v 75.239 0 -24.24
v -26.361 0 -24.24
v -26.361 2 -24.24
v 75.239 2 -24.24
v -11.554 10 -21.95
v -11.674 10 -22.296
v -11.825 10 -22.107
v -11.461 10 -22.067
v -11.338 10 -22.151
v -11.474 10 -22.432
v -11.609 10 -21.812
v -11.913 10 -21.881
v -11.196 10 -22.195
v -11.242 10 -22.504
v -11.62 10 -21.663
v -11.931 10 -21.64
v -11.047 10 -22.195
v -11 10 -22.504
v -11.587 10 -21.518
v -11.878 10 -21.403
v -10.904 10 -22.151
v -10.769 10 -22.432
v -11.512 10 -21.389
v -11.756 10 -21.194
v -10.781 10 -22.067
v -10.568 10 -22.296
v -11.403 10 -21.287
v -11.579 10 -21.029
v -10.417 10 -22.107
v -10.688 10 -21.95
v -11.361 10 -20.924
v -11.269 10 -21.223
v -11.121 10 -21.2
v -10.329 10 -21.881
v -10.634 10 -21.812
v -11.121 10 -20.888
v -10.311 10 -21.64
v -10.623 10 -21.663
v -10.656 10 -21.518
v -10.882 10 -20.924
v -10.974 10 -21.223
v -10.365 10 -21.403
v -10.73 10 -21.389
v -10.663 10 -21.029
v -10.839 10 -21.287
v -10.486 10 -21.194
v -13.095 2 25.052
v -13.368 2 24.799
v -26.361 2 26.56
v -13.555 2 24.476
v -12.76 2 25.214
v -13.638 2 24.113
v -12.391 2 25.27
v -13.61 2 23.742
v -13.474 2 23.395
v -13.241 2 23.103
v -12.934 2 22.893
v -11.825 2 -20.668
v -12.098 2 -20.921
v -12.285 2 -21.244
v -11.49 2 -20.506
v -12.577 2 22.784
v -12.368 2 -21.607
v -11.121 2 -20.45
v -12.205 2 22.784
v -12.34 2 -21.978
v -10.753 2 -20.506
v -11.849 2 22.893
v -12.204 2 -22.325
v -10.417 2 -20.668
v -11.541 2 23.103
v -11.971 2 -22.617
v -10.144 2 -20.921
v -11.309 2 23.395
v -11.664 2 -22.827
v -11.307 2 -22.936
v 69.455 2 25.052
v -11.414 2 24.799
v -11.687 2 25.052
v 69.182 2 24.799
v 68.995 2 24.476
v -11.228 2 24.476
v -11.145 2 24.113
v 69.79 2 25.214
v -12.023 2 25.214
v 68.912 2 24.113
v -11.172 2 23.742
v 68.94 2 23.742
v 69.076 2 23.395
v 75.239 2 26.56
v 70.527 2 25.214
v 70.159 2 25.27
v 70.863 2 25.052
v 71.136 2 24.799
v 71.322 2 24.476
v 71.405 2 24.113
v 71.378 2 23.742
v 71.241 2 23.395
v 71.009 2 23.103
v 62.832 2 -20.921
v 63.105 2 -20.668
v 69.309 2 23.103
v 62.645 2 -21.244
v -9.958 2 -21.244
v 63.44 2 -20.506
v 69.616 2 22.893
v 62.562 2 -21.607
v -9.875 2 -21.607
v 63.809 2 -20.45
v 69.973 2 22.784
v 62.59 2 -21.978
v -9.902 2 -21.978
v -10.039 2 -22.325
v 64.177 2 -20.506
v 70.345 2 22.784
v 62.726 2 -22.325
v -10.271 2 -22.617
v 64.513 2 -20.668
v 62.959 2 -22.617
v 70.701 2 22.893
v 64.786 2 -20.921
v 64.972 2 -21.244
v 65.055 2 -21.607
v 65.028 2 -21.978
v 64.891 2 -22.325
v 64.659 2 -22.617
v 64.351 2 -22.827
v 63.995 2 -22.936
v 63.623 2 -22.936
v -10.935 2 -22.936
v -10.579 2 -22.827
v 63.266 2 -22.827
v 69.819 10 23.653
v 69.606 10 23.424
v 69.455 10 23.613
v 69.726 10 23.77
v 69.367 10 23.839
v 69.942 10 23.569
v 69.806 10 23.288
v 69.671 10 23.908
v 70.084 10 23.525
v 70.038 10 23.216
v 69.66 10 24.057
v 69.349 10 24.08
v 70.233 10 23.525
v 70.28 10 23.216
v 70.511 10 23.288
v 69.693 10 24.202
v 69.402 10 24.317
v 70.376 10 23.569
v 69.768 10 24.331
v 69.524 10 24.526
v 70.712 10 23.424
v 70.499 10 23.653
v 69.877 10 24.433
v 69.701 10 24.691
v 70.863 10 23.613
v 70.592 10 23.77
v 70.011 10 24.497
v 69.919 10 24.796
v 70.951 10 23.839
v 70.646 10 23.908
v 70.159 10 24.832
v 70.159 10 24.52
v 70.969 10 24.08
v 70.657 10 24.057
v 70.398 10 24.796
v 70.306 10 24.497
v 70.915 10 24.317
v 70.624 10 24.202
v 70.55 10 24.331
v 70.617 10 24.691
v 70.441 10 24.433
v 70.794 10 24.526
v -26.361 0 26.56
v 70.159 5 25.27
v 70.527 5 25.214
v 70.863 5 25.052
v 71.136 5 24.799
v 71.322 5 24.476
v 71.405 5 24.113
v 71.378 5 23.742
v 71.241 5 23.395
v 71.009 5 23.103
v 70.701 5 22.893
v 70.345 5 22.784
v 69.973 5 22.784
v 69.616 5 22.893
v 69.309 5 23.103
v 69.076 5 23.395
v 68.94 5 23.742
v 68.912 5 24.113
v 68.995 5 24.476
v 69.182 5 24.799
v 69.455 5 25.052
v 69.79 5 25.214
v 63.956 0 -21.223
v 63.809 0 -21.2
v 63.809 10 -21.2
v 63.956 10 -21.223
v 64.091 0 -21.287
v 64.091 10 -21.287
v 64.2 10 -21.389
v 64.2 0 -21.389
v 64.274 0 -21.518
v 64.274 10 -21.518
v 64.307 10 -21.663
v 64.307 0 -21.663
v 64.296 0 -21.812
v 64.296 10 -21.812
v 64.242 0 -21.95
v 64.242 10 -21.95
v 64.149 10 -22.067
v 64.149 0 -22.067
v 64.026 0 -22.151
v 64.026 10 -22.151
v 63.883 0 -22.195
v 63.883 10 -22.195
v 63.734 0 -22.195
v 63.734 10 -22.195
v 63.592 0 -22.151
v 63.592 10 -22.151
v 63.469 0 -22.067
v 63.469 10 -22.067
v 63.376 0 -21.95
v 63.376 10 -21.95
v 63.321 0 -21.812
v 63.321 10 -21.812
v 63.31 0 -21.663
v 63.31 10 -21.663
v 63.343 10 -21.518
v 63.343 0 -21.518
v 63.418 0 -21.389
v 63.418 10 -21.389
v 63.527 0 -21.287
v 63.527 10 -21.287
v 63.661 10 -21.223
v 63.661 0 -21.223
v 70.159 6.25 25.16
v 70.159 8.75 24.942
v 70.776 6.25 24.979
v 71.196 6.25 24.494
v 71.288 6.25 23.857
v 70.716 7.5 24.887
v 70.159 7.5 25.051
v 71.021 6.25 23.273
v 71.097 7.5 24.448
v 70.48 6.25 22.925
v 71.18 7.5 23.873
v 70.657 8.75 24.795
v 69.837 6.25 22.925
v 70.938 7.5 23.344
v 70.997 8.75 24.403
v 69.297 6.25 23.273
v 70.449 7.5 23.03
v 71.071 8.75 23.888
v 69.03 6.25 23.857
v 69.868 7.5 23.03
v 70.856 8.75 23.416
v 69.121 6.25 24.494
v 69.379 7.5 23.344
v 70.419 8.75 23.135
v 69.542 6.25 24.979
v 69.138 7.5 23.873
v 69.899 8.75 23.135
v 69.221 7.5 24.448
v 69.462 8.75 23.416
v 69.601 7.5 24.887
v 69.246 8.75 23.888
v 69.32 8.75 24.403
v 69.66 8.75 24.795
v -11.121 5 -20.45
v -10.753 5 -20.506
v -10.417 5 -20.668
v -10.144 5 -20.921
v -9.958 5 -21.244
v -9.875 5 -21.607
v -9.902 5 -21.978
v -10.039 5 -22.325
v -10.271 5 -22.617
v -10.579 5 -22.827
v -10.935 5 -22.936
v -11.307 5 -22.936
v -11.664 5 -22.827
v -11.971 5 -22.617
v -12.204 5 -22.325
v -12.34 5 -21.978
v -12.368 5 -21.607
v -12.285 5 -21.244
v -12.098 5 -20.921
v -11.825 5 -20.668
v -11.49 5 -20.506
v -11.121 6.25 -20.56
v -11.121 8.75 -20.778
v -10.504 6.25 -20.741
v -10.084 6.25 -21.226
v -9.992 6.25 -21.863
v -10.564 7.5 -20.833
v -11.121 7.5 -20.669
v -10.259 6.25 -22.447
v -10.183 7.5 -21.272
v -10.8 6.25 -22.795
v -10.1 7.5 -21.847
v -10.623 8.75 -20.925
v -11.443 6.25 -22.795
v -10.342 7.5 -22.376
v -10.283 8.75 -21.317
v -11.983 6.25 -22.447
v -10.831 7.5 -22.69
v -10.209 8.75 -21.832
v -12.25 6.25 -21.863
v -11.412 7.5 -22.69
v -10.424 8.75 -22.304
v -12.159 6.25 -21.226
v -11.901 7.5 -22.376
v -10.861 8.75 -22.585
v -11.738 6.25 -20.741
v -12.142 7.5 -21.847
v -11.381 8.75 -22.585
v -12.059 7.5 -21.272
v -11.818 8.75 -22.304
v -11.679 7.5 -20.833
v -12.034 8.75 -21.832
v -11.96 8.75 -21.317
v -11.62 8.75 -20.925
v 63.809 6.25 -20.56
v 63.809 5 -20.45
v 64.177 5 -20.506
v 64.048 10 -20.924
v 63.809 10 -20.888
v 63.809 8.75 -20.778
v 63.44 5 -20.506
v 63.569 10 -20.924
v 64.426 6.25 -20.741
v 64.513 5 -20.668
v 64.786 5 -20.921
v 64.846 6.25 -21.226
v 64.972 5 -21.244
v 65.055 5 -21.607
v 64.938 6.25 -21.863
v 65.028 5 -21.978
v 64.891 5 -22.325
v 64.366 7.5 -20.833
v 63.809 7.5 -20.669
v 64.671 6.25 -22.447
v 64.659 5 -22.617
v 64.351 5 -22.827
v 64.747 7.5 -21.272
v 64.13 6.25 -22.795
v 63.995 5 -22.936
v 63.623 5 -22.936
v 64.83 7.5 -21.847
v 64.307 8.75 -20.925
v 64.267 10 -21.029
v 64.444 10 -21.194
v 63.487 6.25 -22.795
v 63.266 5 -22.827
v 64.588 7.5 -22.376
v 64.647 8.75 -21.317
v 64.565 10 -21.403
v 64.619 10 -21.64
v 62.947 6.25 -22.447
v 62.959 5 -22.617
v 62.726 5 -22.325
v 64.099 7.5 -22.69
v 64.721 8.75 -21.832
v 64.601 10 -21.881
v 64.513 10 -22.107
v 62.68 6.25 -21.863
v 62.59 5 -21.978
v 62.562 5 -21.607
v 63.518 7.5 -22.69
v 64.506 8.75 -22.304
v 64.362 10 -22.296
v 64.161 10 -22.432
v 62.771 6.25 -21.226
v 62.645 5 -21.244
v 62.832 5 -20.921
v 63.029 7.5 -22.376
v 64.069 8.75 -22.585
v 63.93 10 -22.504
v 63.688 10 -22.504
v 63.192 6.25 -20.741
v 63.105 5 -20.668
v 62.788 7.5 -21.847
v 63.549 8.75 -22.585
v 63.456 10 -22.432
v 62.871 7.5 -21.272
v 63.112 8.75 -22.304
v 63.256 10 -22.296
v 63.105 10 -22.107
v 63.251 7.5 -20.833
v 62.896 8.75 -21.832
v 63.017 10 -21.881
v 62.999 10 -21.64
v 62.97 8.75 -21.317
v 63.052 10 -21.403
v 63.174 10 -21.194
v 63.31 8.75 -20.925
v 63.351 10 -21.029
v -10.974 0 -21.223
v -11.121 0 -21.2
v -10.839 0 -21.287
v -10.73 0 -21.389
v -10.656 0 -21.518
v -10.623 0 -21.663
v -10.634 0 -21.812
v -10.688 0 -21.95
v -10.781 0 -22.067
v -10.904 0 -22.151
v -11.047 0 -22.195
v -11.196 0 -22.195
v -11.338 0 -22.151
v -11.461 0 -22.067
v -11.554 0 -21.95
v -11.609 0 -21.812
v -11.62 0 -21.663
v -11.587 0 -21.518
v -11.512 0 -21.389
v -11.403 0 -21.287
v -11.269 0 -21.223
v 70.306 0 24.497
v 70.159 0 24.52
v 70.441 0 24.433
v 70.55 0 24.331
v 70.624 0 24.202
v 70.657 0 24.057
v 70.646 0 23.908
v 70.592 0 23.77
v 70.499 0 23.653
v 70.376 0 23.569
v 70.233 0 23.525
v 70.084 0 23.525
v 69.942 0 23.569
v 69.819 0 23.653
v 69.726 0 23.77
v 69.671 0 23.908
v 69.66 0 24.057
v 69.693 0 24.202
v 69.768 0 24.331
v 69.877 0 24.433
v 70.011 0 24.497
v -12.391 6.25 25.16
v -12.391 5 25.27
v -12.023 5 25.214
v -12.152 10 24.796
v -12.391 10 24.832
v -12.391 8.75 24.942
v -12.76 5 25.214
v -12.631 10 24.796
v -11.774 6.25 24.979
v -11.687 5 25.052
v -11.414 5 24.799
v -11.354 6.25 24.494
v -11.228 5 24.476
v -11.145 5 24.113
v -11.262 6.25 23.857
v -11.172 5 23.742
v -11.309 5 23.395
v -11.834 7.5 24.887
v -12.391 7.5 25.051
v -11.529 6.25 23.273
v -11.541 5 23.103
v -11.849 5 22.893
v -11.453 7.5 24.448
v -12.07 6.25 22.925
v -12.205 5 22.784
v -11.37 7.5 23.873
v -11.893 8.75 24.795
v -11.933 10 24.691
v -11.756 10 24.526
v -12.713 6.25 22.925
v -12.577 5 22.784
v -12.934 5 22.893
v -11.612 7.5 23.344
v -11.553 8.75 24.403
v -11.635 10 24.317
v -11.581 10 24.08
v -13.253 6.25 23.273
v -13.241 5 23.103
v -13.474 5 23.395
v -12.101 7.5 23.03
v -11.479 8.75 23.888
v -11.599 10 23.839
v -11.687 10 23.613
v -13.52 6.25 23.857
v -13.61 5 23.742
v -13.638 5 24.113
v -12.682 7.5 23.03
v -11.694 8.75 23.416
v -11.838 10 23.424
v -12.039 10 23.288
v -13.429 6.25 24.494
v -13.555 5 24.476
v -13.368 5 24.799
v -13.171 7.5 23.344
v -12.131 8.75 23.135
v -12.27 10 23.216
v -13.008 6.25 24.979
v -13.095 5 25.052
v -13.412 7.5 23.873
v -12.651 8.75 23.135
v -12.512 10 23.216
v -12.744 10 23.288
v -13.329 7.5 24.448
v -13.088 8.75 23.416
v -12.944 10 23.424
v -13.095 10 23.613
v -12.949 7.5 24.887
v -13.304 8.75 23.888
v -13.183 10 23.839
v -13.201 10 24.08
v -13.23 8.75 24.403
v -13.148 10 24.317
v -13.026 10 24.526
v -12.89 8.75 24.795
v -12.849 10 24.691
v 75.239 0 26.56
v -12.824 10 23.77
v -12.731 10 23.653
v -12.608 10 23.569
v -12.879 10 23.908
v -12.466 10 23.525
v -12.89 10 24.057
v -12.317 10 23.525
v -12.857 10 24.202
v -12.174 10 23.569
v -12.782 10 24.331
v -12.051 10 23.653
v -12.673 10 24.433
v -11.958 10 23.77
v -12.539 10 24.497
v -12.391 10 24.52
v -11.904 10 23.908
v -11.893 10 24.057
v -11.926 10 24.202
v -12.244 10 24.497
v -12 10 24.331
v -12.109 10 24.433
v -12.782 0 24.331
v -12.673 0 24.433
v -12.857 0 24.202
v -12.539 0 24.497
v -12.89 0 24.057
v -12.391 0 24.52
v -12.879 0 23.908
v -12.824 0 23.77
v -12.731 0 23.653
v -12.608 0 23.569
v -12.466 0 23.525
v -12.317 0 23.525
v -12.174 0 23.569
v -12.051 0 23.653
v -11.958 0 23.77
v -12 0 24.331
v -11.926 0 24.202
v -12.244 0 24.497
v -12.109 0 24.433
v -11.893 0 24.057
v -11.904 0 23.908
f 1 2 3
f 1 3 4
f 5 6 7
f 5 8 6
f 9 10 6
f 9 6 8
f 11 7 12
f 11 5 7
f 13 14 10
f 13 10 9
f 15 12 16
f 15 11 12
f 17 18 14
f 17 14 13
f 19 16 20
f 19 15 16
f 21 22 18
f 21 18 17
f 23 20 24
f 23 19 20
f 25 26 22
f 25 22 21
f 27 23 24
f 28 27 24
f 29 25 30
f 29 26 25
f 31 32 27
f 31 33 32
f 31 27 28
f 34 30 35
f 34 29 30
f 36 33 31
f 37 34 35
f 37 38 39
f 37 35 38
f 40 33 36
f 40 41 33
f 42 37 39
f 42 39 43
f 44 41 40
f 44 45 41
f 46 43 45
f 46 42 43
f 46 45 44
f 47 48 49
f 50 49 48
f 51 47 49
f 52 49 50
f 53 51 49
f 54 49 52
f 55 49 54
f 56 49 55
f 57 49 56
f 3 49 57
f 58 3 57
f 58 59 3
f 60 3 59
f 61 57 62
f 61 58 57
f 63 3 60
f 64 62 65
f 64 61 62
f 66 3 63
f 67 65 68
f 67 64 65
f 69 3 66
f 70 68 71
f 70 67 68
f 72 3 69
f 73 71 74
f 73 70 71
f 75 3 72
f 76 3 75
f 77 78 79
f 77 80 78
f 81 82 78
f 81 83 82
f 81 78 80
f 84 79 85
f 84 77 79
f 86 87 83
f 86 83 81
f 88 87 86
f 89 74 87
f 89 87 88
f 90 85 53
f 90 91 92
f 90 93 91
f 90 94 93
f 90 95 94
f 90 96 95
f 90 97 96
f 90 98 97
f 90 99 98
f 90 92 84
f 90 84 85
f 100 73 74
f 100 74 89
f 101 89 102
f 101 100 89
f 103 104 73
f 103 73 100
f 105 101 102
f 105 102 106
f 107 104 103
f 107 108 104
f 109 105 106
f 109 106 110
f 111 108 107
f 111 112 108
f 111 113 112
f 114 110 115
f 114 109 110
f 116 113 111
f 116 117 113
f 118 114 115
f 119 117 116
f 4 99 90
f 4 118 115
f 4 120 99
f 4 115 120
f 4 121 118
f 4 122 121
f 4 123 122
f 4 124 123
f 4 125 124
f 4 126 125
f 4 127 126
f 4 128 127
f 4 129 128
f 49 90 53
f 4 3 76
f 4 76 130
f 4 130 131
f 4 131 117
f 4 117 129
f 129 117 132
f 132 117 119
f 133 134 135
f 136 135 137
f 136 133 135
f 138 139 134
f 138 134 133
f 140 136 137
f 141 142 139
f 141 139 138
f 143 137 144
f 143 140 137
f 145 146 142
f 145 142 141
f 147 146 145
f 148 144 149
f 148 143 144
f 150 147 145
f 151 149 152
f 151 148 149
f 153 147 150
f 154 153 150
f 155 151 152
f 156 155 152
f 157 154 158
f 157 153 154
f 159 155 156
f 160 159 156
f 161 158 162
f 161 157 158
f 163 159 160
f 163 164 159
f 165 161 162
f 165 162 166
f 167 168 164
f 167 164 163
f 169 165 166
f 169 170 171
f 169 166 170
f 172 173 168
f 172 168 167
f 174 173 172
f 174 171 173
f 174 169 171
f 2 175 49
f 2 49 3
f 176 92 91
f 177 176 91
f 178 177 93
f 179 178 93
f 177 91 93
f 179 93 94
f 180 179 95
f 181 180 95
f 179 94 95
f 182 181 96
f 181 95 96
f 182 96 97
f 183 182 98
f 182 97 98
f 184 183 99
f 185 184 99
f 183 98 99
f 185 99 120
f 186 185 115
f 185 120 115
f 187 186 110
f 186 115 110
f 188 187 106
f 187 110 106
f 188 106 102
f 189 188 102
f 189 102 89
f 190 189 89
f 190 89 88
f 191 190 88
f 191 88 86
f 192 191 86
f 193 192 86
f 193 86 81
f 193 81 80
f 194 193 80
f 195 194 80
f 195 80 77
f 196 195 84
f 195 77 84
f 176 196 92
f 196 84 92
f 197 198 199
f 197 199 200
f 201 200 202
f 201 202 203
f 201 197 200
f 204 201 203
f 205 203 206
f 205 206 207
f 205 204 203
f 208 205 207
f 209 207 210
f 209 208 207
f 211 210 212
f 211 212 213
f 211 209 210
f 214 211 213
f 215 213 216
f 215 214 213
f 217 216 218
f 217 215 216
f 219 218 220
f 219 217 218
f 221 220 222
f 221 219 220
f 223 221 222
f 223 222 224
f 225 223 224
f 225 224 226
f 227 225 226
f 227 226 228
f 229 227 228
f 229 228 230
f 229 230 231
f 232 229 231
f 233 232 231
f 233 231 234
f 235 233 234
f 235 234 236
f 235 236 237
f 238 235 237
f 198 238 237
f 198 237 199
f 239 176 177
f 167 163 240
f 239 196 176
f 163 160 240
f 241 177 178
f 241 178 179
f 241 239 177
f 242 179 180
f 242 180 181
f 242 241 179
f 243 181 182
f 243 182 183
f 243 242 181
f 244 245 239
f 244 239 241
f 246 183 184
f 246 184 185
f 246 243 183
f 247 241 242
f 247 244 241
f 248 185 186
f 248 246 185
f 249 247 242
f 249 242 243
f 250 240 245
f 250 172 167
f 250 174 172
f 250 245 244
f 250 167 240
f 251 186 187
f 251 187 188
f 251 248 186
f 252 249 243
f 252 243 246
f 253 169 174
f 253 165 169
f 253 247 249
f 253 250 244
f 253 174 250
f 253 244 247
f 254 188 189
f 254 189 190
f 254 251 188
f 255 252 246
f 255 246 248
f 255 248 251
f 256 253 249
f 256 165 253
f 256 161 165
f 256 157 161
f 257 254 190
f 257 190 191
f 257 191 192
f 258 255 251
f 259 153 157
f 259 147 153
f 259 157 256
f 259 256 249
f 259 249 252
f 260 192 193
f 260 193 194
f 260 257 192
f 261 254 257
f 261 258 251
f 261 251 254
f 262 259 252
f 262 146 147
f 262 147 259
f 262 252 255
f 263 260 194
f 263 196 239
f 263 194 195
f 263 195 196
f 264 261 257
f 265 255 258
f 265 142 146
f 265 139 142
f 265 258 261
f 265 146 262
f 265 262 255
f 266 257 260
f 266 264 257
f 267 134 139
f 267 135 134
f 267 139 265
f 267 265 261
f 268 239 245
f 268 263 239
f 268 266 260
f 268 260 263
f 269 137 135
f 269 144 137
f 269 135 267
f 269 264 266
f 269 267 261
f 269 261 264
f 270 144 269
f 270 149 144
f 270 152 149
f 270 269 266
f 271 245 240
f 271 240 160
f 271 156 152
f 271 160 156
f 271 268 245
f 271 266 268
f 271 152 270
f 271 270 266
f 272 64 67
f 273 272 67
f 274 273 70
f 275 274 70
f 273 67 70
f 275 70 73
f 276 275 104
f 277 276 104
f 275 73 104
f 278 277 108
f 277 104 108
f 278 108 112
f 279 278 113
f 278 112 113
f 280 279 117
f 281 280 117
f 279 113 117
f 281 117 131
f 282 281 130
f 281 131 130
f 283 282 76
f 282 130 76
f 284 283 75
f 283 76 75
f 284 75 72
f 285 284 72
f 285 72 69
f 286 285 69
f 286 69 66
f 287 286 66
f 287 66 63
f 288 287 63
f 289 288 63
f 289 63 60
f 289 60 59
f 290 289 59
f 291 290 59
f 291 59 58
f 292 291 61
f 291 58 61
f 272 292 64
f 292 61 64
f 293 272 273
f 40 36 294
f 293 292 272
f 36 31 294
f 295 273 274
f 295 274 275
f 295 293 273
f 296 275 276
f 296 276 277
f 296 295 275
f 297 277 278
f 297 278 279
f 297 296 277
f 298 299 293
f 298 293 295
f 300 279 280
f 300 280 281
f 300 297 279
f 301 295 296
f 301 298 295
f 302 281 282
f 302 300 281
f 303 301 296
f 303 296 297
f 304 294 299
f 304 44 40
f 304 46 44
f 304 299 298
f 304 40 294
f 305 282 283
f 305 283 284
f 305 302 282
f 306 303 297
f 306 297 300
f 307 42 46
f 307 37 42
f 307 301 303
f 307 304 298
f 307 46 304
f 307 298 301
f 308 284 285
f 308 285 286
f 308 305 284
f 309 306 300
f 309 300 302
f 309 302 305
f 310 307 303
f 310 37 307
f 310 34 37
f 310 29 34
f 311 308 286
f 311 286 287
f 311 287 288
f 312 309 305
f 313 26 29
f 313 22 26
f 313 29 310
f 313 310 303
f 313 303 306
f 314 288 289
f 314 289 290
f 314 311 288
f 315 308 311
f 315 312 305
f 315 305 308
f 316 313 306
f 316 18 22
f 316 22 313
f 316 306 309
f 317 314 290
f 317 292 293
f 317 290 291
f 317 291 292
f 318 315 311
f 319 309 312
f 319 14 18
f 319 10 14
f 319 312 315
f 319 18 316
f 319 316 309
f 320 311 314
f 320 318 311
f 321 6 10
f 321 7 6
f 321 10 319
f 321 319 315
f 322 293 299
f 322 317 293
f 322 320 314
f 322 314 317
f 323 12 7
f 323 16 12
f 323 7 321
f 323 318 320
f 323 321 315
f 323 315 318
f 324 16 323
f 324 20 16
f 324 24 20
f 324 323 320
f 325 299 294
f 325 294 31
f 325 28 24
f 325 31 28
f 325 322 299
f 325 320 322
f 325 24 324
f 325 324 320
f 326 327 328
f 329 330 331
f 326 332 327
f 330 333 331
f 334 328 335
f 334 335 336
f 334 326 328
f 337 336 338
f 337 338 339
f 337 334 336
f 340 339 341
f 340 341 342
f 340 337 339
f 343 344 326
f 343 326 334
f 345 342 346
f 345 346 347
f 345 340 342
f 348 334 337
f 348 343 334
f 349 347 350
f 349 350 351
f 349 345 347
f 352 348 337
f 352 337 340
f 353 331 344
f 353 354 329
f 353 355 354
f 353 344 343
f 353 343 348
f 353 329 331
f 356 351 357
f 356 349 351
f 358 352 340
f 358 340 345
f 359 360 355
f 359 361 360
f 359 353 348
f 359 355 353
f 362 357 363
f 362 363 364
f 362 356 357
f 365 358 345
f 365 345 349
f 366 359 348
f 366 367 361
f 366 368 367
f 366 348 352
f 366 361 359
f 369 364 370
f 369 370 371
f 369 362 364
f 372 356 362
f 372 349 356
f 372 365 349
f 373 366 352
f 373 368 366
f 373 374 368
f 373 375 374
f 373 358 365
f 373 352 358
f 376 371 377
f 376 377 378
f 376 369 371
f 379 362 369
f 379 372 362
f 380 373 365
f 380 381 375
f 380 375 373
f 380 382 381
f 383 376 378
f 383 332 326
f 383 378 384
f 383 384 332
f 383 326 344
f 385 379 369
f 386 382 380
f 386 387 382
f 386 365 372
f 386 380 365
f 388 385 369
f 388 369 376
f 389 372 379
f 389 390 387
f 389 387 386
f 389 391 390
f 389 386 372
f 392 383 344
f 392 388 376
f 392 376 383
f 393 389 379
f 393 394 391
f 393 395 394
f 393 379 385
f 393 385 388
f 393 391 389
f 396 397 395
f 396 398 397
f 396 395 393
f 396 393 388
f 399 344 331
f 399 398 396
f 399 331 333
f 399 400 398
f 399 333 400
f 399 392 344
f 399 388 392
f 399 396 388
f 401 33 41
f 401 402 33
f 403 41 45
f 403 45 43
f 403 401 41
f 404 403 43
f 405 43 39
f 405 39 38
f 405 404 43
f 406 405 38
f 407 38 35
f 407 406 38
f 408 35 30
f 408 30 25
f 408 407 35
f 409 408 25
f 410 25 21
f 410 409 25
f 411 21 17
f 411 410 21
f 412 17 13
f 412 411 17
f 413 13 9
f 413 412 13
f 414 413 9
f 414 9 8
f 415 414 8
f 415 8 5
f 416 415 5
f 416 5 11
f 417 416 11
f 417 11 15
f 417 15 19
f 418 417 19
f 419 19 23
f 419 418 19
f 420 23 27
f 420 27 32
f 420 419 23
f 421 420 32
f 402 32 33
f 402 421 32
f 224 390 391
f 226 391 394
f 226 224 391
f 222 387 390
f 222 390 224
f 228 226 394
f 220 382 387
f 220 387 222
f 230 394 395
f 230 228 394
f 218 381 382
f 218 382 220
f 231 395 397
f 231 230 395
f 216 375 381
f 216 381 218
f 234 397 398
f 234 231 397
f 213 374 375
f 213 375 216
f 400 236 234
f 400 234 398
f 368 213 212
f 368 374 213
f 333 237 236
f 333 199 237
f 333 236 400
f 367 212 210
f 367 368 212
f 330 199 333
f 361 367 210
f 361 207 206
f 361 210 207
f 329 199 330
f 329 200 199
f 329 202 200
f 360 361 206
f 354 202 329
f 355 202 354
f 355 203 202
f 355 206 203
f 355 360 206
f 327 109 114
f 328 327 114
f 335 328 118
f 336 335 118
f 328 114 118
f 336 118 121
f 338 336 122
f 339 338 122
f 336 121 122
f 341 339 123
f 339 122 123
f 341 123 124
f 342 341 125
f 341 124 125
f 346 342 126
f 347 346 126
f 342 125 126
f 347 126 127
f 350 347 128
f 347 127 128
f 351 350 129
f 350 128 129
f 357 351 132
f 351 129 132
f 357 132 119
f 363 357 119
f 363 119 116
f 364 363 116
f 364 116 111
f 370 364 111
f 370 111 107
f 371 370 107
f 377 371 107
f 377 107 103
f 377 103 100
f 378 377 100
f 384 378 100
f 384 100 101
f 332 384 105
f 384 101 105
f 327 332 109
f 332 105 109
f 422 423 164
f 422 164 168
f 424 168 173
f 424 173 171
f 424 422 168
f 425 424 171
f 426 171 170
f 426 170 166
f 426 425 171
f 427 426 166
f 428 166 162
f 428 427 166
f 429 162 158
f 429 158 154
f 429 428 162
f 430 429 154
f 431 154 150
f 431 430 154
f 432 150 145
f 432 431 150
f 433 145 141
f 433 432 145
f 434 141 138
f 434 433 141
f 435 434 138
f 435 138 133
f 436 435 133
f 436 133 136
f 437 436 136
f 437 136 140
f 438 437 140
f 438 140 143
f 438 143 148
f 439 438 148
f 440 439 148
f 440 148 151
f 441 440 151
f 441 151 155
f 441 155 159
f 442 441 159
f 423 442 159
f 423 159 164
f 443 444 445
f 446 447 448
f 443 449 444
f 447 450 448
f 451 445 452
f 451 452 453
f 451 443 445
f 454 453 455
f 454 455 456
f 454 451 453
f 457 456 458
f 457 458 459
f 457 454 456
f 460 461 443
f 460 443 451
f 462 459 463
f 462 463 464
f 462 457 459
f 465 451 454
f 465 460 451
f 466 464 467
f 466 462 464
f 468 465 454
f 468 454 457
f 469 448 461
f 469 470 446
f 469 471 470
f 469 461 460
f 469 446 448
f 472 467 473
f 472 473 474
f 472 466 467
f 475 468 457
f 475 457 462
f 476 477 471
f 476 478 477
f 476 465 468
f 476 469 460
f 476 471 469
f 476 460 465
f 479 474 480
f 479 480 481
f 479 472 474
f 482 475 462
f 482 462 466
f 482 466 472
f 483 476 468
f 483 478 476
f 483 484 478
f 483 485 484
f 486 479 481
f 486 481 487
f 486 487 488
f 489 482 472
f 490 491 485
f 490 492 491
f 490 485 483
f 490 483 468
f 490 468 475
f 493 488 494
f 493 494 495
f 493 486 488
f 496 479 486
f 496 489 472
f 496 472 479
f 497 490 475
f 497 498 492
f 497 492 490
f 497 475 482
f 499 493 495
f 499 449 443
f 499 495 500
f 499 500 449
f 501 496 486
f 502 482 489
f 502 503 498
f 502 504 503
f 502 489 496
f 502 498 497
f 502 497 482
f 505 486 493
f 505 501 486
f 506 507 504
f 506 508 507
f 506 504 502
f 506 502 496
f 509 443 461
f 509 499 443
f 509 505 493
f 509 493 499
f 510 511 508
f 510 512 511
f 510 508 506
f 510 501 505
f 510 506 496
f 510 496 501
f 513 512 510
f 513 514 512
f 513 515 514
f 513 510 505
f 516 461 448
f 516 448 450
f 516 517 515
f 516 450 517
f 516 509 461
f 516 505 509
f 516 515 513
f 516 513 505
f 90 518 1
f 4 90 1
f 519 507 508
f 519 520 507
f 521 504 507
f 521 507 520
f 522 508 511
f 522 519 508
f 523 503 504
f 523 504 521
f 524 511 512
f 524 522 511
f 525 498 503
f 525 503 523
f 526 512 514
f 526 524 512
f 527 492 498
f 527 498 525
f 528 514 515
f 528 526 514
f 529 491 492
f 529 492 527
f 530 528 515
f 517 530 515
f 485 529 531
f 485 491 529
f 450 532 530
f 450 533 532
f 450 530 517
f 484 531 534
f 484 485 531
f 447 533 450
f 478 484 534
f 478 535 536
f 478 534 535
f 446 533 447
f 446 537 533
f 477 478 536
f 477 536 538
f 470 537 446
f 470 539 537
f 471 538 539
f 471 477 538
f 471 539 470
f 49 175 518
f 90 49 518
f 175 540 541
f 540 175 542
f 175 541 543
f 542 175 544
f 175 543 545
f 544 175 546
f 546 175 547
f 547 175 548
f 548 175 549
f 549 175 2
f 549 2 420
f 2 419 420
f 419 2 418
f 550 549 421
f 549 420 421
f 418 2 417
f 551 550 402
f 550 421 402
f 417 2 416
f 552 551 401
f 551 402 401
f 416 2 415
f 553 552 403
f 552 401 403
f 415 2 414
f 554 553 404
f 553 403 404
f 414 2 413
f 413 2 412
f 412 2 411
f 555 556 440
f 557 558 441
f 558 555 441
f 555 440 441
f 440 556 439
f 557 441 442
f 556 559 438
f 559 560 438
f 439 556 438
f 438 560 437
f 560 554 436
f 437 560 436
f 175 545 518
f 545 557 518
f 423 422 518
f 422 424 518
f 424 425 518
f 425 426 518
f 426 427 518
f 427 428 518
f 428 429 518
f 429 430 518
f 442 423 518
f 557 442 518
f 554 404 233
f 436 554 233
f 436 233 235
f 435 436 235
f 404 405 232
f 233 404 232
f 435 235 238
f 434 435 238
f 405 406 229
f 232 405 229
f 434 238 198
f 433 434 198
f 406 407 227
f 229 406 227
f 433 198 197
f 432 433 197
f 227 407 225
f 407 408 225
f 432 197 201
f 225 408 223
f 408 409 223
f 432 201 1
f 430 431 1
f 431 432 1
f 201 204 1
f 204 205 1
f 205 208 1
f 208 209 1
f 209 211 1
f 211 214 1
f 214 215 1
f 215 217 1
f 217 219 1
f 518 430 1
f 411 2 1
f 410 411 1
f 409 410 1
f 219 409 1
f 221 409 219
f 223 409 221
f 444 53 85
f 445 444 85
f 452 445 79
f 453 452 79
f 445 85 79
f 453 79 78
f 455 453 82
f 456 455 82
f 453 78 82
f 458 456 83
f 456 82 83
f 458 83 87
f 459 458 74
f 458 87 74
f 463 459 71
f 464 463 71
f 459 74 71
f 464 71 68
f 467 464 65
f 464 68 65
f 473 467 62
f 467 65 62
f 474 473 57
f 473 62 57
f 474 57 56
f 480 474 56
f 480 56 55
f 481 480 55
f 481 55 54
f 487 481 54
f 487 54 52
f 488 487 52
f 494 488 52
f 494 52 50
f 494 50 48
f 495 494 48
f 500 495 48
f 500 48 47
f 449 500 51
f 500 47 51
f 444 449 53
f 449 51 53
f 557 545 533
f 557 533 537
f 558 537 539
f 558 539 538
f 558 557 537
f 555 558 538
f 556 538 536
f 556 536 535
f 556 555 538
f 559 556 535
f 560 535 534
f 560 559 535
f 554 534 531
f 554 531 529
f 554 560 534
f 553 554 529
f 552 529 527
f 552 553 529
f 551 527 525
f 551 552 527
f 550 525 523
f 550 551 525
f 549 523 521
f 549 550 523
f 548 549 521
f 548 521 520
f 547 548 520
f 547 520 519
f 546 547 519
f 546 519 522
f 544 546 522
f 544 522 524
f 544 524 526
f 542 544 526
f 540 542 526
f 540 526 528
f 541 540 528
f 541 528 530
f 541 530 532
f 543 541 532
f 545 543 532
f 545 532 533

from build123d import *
from OCP.BRepFilletAPI import BRepFilletAPI_MakeChamfer

# Parameters (mm, degrees)
SKETCH1_W           = 101.6
SKETCH1_H           = 50.8
SKETCH1_R           = 0.5
BOSS_EXTRUDE1_DEPTH = 2
SKETCH2_R           = 1.25
SKETCH2_R_2         = 0.5
BOSS_EXTRUDE2_DEPTH = 8
CHAMFER1_SIZE       = 5
CHAMFER1_SIZE2      = 0.437443318


with BuildPart() as part:
    # Sketch1 → Boss-Extrude1 (new body)
    with BuildSketch(Plane(origin=(0, 0, 0), x_dir=(1, 0, 0), z_dir=(0, 1, 0))):
        with Locations((24.438845131, -1.159672083)):
            Rectangle(SKETCH1_W, SKETCH1_H)
        with Locations(Location((-11.121154869, 21.700327917, 0), (0, 0, 270))):
            Circle(SKETCH1_R, mode=Mode.SUBTRACT)
        with Locations(Location((-12.391154869, -24.019672083, 0), (0, 0, 270))):
            Circle(SKETCH1_R, mode=Mode.SUBTRACT)
        with Locations(Location((63.808845131, 21.700327917, 0), (0, 0, 270))):
            Circle(SKETCH1_R, mode=Mode.SUBTRACT)
        with Locations(Location((70.158845131, -24.019672083, 0), (0, 0, 270))):
            Circle(SKETCH1_R, mode=Mode.SUBTRACT)
    extrude(amount=BOSS_EXTRUDE1_DEPTH)

    # Sketch2 → Boss-Extrude2 (add)
    # profile 1 of 4: a face of its own
    with BuildSketch(Plane(origin=(0, 2, 0), x_dir=(1, 0, 0), z_dir=(0, 1, 0))):
        with Locations(Location((-11.121154869, 21.700327917, 0), (0, 0, 270))):
            Circle(SKETCH2_R)
        with Locations(Location((-11.121154869, 21.700327917, 0), (0, 0, 270))):
            Circle(SKETCH2_R_2, mode=Mode.SUBTRACT)
    # profile 2 of 4: a face of its own
    with BuildSketch(Plane(origin=(0, 2, 0), x_dir=(1, 0, 0), z_dir=(0, 1, 0))):
        with Locations(Location((-12.391154869, -24.019672083, 0), (0, 0, 270))):
            Circle(SKETCH2_R)
        with Locations(Location((-12.391154869, -24.019672083, 0), (0, 0, 270))):
            Circle(SKETCH2_R_2, mode=Mode.SUBTRACT)
    # profile 3 of 4: a face of its own
    with BuildSketch(Plane(origin=(0, 2, 0), x_dir=(1, 0, 0), z_dir=(0, 1, 0))):
        with Locations(Location((70.158845131, -24.019672083, 0), (0, 0, 270))):
            Circle(SKETCH2_R)
        with Locations(Location((70.158845131, -24.019672083, 0), (0, 0, 270))):
            Circle(SKETCH2_R_2, mode=Mode.SUBTRACT)
    # profile 4 of 4: a face of its own
    with BuildSketch(Plane(origin=(0, 2, 0), x_dir=(1, 0, 0), z_dir=(0, 1, 0))):
        with Locations(Location((63.808845131, 21.700327917, 0), (0, 0, 270))):
            Circle(SKETCH2_R)
        with Locations(Location((63.808845131, 21.700327917, 0), (0, 0, 270))):
            Circle(SKETCH2_R_2, mode=Mode.SUBTRACT)
    extrude(amount=BOSS_EXTRUDE2_DEPTH)

    # Chamfer1: one chamfer whose edges measure the first distance from different faces: ONE call of the kernel's chamfer builder (chamfer() names one face for all edges)
    chamfer1_edges_1 = [part.edges().sort_by_distance(p)[0] for p in [
        (-11.121154869, 10, -22.950327917),
    ]]
    chamfer1_side_1 = [part.faces().sort_by_distance(p)[0] for p in [
        (-11.121154869, 6, -22.950327917),
    ]]
    chamfer1_edges_2 = [part.edges().sort_by_distance(p)[0] for p in [
        (-12.391154869, 10, 22.769672083),
    ]]
    chamfer1_side_2 = [part.faces().sort_by_distance(p)[0] for p in [
        (-12.391154869, 6, 22.769672083),
    ]]
    chamfer1_edges_3 = [part.edges().sort_by_distance(p)[0] for p in [
        (70.158845131, 10, 22.769672083),
    ]]
    chamfer1_side_3 = [part.faces().sort_by_distance(p)[0] for p in [
        (70.158845131, 6, 22.769672083),
    ]]
    chamfer1_edges_4 = [part.edges().sort_by_distance(p)[0] for p in [
        (63.808845131, 10, -22.950327917),
    ]]
    chamfer1_side_4 = [part.faces().sort_by_distance(p)[0] for p in [
        (63.808845131, 6, -22.950327917),
    ]]
    chamfer1 = BRepFilletAPI_MakeChamfer(part.part.solid().wrapped)
    for e in chamfer1_edges_1:
        chamfer1.Add(CHAMFER1_SIZE, CHAMFER1_SIZE2, e.wrapped, chamfer1_side_1[0].wrapped)  # the first distance lies on this face
    for e in chamfer1_edges_2:
        chamfer1.Add(CHAMFER1_SIZE, CHAMFER1_SIZE2, e.wrapped, chamfer1_side_2[0].wrapped)  # the first distance lies on this face
    for e in chamfer1_edges_3:
        chamfer1.Add(CHAMFER1_SIZE, CHAMFER1_SIZE2, e.wrapped, chamfer1_side_3[0].wrapped)  # the first distance lies on this face
    for e in chamfer1_edges_4:
        chamfer1.Add(CHAMFER1_SIZE, CHAMFER1_SIZE2, e.wrapped, chamfer1_side_4[0].wrapped)  # the first distance lies on this face
    add(Compound.cast(chamfer1.Shape()), mode=Mode.REPLACE)


solid = part.part
